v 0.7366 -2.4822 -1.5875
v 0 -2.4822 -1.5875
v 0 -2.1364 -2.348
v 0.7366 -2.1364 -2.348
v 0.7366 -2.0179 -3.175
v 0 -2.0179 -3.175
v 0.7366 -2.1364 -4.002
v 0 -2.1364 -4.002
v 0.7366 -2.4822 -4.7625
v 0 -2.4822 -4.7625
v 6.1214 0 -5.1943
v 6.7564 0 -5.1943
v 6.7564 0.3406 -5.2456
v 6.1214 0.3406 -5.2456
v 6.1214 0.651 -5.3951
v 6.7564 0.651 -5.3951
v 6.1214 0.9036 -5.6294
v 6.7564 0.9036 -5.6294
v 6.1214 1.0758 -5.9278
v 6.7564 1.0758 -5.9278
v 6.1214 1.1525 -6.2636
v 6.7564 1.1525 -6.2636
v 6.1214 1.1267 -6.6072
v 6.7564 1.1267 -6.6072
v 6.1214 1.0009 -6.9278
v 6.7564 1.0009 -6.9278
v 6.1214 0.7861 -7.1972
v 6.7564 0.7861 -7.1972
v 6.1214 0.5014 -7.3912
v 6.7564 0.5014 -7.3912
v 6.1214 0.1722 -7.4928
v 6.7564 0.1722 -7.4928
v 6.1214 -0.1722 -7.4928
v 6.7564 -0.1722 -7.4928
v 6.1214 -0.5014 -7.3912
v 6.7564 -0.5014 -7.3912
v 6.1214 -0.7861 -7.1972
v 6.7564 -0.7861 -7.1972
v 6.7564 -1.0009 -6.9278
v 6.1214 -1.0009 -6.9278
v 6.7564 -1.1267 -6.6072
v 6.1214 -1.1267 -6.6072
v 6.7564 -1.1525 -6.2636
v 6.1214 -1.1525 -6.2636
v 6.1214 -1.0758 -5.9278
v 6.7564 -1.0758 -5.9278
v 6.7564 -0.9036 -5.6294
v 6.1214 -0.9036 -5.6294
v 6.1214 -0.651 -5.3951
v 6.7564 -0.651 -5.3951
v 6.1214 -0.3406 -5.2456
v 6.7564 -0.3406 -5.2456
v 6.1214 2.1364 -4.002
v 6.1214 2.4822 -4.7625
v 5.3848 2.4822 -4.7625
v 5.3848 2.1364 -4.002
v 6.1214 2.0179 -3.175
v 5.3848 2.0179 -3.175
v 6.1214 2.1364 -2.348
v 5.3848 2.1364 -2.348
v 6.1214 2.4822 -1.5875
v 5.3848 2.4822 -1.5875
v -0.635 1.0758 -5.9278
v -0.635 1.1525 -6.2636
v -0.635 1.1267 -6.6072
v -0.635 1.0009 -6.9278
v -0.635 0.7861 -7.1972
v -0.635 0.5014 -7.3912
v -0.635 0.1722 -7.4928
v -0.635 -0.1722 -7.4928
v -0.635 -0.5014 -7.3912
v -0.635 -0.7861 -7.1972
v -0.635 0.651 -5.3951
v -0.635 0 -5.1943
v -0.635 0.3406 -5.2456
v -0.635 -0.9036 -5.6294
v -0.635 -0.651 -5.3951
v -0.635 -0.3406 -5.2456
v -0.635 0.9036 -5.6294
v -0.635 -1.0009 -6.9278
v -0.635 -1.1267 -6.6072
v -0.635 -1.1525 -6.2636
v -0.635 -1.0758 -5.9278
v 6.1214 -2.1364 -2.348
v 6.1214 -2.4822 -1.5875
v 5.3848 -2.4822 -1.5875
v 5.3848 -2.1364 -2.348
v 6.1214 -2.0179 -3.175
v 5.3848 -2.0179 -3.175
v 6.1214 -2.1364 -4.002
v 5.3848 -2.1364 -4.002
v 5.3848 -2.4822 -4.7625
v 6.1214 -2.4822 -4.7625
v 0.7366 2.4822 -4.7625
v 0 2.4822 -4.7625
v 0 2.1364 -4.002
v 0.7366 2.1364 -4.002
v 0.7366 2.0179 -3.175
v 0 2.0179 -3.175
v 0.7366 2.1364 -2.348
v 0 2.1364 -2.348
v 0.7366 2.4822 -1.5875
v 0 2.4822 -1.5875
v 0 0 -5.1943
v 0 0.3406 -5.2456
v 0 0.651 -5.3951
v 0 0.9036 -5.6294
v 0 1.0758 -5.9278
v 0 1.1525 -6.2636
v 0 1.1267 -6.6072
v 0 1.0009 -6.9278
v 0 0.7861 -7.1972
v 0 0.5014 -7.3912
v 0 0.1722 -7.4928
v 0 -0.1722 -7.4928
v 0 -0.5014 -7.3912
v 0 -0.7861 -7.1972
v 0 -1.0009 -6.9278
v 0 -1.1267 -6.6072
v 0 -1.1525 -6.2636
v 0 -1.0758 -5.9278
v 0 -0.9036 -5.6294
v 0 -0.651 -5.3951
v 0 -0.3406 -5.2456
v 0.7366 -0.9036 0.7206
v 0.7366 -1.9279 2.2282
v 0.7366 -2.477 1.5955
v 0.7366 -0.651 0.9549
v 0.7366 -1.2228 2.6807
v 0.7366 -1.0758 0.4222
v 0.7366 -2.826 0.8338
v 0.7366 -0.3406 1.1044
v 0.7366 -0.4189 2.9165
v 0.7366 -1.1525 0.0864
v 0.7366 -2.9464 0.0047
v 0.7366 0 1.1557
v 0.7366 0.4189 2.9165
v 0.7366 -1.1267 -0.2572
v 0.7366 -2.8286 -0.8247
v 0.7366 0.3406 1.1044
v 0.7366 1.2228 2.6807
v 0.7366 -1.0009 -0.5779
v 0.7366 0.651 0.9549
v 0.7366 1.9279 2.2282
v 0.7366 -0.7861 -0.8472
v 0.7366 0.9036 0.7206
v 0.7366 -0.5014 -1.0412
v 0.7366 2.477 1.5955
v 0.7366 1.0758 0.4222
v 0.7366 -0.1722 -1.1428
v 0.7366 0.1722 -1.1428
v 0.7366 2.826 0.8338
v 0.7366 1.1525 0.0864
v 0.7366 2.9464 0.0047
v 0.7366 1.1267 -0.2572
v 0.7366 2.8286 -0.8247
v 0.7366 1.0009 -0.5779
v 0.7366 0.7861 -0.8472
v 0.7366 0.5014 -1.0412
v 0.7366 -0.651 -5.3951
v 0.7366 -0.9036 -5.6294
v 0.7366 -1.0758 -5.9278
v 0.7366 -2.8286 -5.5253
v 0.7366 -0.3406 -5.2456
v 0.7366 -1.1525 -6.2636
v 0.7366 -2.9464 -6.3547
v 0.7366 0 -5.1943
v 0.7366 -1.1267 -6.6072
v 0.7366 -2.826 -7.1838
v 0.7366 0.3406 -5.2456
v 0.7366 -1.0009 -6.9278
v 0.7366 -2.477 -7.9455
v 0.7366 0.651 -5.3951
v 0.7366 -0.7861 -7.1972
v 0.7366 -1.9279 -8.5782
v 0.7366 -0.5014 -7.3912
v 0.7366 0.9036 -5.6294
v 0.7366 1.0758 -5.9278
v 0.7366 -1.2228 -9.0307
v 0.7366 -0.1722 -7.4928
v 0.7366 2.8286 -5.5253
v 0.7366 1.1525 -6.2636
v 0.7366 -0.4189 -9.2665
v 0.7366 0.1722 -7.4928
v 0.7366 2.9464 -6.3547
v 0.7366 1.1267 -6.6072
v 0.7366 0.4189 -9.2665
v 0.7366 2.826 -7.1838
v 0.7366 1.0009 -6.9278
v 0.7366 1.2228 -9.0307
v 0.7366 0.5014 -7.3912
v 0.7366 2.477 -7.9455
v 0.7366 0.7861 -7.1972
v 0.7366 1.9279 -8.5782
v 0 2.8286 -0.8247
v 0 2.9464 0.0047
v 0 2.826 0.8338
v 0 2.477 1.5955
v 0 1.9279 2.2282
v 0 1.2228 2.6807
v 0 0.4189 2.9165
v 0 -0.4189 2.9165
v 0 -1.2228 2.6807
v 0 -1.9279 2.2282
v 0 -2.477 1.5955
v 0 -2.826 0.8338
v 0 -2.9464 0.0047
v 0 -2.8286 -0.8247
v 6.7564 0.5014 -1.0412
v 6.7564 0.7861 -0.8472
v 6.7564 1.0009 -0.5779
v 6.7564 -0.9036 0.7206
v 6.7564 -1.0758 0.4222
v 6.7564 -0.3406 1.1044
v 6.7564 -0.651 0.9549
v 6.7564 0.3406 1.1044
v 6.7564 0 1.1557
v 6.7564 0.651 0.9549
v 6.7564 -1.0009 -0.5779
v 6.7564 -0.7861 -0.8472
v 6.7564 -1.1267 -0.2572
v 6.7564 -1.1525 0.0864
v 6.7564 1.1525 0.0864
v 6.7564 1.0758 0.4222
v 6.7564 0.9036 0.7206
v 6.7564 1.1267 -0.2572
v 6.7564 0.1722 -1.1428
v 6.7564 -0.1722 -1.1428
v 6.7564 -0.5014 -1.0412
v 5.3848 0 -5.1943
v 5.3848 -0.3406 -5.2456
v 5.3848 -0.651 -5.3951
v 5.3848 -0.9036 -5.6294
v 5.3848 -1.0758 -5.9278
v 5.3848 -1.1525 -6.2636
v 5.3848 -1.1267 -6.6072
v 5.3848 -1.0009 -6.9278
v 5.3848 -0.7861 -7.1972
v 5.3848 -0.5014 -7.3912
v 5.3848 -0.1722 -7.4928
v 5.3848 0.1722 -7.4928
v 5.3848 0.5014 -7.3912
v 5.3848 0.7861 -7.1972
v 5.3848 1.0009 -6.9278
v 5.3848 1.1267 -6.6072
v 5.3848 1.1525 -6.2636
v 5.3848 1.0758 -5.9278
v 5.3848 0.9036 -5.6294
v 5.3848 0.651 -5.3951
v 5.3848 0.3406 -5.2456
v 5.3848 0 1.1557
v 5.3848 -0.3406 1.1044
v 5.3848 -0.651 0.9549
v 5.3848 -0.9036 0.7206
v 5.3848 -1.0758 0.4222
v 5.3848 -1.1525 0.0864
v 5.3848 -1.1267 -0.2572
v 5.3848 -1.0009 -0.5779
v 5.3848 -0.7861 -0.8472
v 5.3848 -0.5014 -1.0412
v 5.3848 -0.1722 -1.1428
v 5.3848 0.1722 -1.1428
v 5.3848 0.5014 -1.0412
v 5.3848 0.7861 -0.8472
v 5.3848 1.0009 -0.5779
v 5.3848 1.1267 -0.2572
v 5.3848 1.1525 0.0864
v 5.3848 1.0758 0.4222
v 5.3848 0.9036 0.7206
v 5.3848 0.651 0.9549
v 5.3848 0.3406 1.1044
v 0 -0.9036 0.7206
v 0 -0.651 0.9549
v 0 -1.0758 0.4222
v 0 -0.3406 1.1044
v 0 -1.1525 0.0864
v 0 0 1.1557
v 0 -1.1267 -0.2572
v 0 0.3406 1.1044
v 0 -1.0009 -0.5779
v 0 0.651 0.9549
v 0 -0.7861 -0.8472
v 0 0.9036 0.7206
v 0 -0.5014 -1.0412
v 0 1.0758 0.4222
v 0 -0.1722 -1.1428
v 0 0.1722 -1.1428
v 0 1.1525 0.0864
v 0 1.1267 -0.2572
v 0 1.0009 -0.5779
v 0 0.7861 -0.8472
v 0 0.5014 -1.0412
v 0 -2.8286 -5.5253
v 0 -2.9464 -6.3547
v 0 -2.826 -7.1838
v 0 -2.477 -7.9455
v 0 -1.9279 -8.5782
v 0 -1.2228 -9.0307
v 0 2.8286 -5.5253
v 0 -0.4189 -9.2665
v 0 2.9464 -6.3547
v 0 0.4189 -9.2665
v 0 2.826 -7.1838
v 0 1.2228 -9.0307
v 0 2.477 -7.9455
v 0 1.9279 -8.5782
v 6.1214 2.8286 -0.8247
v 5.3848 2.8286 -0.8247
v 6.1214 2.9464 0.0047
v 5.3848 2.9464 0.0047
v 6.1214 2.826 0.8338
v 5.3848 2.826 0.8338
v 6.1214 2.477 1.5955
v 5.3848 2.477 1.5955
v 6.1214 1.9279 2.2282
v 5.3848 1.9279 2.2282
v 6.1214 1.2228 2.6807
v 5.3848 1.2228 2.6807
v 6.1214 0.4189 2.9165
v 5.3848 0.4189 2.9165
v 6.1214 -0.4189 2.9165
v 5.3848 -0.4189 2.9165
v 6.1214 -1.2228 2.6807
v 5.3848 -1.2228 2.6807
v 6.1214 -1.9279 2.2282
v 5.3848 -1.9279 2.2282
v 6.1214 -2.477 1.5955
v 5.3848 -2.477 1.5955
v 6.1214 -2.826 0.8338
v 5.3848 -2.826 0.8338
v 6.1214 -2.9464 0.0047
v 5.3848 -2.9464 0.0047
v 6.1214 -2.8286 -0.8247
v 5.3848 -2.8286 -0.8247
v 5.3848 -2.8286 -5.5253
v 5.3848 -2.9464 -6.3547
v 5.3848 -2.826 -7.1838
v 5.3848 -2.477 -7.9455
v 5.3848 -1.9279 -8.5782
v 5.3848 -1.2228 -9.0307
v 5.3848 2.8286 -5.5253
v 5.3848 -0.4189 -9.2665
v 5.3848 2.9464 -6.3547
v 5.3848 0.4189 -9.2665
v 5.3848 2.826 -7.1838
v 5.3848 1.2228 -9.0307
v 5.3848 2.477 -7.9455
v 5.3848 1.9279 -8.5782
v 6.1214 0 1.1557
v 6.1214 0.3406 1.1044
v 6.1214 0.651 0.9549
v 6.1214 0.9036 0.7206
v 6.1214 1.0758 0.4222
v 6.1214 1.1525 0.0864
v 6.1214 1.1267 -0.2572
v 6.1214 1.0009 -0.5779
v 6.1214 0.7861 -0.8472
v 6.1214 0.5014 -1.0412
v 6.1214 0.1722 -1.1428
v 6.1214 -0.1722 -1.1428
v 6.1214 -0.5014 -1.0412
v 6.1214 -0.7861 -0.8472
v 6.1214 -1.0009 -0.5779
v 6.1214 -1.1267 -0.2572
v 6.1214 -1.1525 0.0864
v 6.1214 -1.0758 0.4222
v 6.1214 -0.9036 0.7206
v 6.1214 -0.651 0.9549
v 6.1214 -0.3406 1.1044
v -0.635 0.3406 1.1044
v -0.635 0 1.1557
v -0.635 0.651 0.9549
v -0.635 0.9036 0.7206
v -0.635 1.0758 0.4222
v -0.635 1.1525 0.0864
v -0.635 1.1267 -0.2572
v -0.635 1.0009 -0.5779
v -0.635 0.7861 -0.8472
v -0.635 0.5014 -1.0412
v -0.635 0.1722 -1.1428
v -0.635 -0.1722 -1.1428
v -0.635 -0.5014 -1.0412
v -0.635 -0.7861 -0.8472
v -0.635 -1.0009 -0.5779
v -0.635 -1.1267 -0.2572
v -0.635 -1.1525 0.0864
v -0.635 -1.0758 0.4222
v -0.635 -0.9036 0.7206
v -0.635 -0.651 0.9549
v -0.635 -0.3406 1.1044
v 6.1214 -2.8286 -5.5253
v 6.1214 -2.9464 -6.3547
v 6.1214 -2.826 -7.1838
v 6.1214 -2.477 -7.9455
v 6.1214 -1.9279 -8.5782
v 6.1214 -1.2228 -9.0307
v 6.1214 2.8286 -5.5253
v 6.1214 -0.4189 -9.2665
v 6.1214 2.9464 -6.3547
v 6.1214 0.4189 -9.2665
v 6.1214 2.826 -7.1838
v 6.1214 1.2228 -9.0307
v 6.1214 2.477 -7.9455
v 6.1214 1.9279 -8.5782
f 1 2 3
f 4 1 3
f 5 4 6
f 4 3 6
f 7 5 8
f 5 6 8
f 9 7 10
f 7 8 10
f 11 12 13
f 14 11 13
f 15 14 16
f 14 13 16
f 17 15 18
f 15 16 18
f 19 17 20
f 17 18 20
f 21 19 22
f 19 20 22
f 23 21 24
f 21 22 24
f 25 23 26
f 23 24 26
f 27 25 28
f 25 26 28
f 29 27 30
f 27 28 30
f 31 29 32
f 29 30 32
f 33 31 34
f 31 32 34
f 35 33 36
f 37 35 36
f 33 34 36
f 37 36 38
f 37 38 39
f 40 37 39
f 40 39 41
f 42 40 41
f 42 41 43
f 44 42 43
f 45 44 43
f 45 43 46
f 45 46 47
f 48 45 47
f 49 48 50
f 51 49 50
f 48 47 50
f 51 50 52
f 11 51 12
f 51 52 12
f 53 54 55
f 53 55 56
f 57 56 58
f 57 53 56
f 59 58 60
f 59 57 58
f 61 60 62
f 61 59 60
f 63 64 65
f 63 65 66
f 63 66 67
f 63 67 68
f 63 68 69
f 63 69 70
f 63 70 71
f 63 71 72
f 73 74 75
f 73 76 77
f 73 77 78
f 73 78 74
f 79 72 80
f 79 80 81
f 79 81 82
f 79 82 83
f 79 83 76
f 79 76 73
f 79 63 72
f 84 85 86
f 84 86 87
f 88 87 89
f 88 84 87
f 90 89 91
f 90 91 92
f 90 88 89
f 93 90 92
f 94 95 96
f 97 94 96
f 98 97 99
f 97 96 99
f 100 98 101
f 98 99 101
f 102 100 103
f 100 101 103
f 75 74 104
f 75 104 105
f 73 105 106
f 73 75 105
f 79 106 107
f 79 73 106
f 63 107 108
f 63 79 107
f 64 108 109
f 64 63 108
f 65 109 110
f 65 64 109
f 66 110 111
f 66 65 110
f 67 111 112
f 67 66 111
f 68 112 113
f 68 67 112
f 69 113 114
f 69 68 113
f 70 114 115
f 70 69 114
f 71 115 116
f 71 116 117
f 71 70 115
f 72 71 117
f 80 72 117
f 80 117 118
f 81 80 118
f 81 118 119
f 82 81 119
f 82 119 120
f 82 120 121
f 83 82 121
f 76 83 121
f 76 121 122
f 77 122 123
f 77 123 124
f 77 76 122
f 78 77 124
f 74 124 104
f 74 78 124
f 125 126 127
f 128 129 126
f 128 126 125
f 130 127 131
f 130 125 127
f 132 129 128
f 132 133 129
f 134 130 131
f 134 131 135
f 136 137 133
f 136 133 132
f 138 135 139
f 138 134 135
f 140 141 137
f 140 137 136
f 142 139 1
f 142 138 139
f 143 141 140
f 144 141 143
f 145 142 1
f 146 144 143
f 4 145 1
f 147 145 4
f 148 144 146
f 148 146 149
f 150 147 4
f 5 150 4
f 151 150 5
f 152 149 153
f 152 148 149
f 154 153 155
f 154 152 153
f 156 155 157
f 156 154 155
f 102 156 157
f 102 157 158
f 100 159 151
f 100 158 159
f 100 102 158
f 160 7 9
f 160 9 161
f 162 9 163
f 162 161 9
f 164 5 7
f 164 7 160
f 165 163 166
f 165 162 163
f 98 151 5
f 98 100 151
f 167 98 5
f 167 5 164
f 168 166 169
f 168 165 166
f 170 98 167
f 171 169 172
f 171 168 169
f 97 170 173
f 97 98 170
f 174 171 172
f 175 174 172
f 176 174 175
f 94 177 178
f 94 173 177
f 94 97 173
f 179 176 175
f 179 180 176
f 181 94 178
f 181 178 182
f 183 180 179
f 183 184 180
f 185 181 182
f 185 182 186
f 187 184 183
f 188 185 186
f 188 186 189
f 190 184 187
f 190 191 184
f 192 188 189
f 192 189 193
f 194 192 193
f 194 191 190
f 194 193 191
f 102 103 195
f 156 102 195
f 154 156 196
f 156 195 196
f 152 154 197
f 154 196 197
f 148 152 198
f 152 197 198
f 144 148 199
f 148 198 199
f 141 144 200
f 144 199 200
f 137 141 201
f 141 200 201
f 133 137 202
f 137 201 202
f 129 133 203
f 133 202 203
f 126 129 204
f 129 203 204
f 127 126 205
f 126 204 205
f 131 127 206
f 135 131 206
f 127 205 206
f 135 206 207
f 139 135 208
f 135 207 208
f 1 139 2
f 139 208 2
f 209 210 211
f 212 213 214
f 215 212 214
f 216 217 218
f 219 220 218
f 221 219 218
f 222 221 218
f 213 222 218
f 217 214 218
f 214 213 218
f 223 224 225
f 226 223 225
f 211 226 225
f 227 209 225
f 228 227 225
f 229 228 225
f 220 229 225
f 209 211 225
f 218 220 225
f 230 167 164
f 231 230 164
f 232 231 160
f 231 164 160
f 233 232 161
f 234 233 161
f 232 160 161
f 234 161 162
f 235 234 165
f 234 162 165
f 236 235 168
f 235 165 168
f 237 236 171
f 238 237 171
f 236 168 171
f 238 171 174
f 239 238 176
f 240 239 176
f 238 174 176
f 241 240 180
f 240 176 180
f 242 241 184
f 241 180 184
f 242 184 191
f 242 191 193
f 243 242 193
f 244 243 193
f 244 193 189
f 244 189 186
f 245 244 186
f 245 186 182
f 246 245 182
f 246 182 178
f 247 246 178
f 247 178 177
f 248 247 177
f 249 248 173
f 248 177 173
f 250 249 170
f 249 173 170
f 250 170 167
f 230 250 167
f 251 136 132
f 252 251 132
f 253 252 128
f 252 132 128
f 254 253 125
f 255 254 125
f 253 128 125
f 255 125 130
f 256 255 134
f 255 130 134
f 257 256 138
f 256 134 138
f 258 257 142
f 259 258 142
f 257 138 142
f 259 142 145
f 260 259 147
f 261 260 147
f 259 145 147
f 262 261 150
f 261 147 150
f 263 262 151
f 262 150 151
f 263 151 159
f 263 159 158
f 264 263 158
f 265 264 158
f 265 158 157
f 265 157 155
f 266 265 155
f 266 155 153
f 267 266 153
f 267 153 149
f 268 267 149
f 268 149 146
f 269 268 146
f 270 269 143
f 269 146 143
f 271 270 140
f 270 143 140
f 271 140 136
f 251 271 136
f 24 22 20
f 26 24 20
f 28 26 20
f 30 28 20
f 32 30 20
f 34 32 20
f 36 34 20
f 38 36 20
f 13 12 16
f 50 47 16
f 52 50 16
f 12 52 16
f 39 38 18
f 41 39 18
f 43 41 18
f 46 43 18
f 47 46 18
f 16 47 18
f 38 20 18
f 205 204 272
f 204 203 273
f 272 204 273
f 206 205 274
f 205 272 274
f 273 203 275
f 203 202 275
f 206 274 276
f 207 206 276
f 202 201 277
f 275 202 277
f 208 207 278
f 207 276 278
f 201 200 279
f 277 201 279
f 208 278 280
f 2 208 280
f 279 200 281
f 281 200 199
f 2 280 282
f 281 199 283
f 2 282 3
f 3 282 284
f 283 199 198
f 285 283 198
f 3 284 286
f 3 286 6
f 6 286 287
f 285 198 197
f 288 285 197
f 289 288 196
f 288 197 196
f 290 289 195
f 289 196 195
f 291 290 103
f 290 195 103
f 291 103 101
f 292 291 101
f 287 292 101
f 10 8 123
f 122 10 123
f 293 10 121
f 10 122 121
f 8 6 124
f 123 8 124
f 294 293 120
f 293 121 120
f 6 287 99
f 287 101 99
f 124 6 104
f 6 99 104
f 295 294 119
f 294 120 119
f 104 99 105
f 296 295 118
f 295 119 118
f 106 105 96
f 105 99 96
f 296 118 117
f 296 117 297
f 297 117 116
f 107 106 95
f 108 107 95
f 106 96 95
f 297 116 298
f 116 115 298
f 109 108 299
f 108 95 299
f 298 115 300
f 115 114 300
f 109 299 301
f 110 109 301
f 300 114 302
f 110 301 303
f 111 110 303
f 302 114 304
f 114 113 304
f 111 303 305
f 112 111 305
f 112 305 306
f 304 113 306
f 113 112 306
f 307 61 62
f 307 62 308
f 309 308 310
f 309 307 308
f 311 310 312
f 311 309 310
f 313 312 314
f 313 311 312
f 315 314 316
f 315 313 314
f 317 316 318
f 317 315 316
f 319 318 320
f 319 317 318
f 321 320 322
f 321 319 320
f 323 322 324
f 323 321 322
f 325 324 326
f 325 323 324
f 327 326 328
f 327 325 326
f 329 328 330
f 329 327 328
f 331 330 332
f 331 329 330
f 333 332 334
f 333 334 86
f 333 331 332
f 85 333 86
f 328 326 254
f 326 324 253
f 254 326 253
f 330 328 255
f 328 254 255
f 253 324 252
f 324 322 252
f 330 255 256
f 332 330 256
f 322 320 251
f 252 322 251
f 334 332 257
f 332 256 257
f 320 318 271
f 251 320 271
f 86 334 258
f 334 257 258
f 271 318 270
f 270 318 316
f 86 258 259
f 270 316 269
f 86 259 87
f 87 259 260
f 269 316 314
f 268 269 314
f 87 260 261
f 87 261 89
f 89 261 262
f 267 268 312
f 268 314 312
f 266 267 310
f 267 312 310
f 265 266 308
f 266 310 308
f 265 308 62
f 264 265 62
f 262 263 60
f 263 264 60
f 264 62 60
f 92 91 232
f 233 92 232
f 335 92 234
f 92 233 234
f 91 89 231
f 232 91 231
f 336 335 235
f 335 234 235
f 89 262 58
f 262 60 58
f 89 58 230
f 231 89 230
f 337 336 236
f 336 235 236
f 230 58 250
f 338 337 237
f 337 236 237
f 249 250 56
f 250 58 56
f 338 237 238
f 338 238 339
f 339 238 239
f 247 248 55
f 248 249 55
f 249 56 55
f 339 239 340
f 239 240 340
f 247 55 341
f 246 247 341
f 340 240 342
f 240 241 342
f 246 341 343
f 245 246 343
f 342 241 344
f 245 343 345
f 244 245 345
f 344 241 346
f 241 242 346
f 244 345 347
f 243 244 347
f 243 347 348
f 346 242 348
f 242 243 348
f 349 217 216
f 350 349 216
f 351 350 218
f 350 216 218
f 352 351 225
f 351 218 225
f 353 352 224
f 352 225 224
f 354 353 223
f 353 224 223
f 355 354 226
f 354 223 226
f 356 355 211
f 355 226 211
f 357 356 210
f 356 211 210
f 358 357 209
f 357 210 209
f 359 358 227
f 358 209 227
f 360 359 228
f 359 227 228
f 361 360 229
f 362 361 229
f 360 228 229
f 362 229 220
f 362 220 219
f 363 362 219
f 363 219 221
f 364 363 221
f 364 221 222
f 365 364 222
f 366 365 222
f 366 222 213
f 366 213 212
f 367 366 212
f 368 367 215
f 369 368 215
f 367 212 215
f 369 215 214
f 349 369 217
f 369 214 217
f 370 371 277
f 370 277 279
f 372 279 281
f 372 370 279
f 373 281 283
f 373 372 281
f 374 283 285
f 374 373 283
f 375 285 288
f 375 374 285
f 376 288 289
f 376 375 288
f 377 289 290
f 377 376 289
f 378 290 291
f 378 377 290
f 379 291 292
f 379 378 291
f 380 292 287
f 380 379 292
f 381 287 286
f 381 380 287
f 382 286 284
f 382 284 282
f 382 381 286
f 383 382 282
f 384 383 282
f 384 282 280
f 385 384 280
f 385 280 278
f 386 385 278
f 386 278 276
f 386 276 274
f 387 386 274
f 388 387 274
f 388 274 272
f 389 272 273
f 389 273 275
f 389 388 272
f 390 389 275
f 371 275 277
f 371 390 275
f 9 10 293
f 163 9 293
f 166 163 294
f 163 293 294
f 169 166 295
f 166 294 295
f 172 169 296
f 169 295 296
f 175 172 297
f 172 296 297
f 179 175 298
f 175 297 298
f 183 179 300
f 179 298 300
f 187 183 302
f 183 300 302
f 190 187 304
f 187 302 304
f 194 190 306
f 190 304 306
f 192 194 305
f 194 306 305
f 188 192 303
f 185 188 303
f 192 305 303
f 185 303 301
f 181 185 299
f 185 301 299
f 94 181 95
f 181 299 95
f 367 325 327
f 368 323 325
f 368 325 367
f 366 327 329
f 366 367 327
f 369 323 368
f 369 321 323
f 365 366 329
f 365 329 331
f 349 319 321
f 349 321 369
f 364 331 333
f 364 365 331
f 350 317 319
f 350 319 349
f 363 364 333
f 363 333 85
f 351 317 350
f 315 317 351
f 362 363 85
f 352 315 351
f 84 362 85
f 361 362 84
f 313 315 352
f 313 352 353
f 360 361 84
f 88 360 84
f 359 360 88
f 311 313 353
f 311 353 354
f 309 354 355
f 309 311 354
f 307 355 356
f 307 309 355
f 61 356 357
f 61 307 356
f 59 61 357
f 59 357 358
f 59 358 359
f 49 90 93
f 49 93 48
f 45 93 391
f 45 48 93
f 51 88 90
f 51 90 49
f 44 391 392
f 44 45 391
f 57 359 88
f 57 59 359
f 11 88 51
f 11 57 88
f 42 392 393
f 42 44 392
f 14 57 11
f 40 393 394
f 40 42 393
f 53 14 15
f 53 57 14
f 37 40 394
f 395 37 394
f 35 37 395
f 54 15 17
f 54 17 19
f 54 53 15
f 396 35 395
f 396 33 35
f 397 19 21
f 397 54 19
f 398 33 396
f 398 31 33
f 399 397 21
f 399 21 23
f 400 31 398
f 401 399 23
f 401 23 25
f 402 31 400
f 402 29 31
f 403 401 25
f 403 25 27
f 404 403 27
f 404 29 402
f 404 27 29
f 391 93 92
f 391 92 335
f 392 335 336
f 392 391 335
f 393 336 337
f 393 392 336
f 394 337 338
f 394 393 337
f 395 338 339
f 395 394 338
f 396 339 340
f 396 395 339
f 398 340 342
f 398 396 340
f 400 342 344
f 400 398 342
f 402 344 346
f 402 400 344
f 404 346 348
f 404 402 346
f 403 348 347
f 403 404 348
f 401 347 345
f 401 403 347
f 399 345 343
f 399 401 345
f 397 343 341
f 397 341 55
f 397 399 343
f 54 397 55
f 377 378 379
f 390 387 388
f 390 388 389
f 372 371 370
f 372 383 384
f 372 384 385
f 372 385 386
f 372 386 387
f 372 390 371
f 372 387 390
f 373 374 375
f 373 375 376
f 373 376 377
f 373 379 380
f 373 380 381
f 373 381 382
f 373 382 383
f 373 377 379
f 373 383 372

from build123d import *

# Parameters (mm, degrees)
BOSS_EXTRUDE1_DEPTH = 0.7366
SKETCH2_R           = 1.1557
BOSS_EXTRUDE2_DEPTH = 4.6482
BOSS_EXTRUDE3_START = 0.635
SKETCH3_R           = 1.1557
BOSS_EXTRUDE3_DEPTH = 0.635


with BuildPart() as part:
    # Sketch1 → Boss-Extrude1 (new body)
    with BuildSketch(Plane(origin=(0, 0, 0), x_dir=(0, 0, -1), z_dir=(1, 0, 0))):
        with BuildLine():
            ThreePointArc((1.5875, 2.482159687), (-2.9464, 0), (1.5875, -2.482159687))
            ThreePointArc((1.5875, -2.482159687), (3.175, -2.017919373), (4.7625, -2.482159687))
            ThreePointArc((4.7625, -2.482159687), (9.2964, 0), (4.7625, 2.482159687))
            ThreePointArc((4.7625, 2.482159687), (3.175, 2.017919373), (1.5875, 2.482159687))
        make_face()
    boss_extrude1 = extrude(amount=BOSS_EXTRUDE1_DEPTH)

    # Sketch2 → Boss-Extrude2 (add)
    with BuildSketch(Plane(origin=(0.7366, 0, 0), x_dir=(0, 0, -1), z_dir=(1, 0, 0))):
        with Locations(Location((0, 0, 0), (0, 0, 180))):
            Circle(SKETCH2_R)
        with Locations(Location((6.35, 0, 0), (0, 0, 180))):
            Circle(SKETCH2_R)
    extrude(amount=BOSS_EXTRUDE2_DEPTH)

    # Sketch3 → Boss-Extrude3 (add)
    with BuildSketch(Plane.ZY.offset(BOSS_EXTRUDE3_START)):
        Circle(SKETCH3_R)
        with Locations((-6.35, 0)):
            Circle(SKETCH3_R)
    boss_extrude3 = extrude(amount=-BOSS_EXTRUDE3_DEPTH)

    # Mirror1: Boss-Extrude1, Boss-Extrude3 across plane
    add(boss_extrude1.mirror(Plane(origin=(3.0607, 0, 0), x_dir=(0, 0, 1), z_dir=(1, 0, 0))))
    add(boss_extrude3.mirror(Plane(origin=(3.0607, 0, 0), x_dir=(0, 0, 1), z_dir=(1, 0, 0))))


solid = part.part
